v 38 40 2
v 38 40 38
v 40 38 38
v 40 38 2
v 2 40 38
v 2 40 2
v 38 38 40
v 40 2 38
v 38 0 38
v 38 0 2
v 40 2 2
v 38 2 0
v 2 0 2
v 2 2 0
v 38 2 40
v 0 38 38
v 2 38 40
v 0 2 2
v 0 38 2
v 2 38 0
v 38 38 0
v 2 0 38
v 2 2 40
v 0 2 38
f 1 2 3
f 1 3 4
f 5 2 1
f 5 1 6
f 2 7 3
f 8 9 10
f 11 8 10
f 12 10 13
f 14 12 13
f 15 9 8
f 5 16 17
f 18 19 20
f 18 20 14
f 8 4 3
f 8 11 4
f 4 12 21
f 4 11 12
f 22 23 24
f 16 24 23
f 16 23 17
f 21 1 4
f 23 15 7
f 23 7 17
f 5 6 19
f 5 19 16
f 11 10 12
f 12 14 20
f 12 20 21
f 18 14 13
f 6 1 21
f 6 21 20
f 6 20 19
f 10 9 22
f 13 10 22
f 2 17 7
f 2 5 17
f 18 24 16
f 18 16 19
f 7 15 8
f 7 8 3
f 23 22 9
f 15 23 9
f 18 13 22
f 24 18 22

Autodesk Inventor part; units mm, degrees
ref_plane "YZ Plane" through (0, 0, 0) normal (1, 0, 0) x (0, 1, 0)
ref_plane "XZ Plane" through (0, 0, 0) normal (0, 1, 0) x (-1, 0, 0)
ref_plane "XY Plane" through (0, 0, 0) normal (0, 0, 1) x (1, 0, 0)
sketch "Sketch1" plane through (0, 0, 0) normal (0, 1, 0) x (-1, 0, 0)
  line L0 (0, 0) -> (-40, 0)
  line L1 (-40, 0) -> (-40, 40)
  line L2 (-40, 40) -> (0, 40)
  line L3 (0, 40) -> (0, 0)
  dimension "d0" = 40
  dimension "d1" = 40
extrude "Extrusion1" add sketch "Sketch1" along normal blind 40
chamfer "Chamfer1" distance 2 angle 45 12 edges at (20, 0, 40) (40, 0, 20) (20, 40, 0) (20, 0, 0) (0, 20, 0) (0, 40, 20) (0, 20, 40) (0, 0, 20) (20, 40, 40) (40, 20, 40) (40, 40, 20) (40, 20, 0)
equation "\"d0\" = CUBE_D"
equation "\"d1\" = CUBE_D"
equation "\"d2\" = CUBE_D"
equation "\"CUBE_D\" = 40"
properties part number "CUBE"
